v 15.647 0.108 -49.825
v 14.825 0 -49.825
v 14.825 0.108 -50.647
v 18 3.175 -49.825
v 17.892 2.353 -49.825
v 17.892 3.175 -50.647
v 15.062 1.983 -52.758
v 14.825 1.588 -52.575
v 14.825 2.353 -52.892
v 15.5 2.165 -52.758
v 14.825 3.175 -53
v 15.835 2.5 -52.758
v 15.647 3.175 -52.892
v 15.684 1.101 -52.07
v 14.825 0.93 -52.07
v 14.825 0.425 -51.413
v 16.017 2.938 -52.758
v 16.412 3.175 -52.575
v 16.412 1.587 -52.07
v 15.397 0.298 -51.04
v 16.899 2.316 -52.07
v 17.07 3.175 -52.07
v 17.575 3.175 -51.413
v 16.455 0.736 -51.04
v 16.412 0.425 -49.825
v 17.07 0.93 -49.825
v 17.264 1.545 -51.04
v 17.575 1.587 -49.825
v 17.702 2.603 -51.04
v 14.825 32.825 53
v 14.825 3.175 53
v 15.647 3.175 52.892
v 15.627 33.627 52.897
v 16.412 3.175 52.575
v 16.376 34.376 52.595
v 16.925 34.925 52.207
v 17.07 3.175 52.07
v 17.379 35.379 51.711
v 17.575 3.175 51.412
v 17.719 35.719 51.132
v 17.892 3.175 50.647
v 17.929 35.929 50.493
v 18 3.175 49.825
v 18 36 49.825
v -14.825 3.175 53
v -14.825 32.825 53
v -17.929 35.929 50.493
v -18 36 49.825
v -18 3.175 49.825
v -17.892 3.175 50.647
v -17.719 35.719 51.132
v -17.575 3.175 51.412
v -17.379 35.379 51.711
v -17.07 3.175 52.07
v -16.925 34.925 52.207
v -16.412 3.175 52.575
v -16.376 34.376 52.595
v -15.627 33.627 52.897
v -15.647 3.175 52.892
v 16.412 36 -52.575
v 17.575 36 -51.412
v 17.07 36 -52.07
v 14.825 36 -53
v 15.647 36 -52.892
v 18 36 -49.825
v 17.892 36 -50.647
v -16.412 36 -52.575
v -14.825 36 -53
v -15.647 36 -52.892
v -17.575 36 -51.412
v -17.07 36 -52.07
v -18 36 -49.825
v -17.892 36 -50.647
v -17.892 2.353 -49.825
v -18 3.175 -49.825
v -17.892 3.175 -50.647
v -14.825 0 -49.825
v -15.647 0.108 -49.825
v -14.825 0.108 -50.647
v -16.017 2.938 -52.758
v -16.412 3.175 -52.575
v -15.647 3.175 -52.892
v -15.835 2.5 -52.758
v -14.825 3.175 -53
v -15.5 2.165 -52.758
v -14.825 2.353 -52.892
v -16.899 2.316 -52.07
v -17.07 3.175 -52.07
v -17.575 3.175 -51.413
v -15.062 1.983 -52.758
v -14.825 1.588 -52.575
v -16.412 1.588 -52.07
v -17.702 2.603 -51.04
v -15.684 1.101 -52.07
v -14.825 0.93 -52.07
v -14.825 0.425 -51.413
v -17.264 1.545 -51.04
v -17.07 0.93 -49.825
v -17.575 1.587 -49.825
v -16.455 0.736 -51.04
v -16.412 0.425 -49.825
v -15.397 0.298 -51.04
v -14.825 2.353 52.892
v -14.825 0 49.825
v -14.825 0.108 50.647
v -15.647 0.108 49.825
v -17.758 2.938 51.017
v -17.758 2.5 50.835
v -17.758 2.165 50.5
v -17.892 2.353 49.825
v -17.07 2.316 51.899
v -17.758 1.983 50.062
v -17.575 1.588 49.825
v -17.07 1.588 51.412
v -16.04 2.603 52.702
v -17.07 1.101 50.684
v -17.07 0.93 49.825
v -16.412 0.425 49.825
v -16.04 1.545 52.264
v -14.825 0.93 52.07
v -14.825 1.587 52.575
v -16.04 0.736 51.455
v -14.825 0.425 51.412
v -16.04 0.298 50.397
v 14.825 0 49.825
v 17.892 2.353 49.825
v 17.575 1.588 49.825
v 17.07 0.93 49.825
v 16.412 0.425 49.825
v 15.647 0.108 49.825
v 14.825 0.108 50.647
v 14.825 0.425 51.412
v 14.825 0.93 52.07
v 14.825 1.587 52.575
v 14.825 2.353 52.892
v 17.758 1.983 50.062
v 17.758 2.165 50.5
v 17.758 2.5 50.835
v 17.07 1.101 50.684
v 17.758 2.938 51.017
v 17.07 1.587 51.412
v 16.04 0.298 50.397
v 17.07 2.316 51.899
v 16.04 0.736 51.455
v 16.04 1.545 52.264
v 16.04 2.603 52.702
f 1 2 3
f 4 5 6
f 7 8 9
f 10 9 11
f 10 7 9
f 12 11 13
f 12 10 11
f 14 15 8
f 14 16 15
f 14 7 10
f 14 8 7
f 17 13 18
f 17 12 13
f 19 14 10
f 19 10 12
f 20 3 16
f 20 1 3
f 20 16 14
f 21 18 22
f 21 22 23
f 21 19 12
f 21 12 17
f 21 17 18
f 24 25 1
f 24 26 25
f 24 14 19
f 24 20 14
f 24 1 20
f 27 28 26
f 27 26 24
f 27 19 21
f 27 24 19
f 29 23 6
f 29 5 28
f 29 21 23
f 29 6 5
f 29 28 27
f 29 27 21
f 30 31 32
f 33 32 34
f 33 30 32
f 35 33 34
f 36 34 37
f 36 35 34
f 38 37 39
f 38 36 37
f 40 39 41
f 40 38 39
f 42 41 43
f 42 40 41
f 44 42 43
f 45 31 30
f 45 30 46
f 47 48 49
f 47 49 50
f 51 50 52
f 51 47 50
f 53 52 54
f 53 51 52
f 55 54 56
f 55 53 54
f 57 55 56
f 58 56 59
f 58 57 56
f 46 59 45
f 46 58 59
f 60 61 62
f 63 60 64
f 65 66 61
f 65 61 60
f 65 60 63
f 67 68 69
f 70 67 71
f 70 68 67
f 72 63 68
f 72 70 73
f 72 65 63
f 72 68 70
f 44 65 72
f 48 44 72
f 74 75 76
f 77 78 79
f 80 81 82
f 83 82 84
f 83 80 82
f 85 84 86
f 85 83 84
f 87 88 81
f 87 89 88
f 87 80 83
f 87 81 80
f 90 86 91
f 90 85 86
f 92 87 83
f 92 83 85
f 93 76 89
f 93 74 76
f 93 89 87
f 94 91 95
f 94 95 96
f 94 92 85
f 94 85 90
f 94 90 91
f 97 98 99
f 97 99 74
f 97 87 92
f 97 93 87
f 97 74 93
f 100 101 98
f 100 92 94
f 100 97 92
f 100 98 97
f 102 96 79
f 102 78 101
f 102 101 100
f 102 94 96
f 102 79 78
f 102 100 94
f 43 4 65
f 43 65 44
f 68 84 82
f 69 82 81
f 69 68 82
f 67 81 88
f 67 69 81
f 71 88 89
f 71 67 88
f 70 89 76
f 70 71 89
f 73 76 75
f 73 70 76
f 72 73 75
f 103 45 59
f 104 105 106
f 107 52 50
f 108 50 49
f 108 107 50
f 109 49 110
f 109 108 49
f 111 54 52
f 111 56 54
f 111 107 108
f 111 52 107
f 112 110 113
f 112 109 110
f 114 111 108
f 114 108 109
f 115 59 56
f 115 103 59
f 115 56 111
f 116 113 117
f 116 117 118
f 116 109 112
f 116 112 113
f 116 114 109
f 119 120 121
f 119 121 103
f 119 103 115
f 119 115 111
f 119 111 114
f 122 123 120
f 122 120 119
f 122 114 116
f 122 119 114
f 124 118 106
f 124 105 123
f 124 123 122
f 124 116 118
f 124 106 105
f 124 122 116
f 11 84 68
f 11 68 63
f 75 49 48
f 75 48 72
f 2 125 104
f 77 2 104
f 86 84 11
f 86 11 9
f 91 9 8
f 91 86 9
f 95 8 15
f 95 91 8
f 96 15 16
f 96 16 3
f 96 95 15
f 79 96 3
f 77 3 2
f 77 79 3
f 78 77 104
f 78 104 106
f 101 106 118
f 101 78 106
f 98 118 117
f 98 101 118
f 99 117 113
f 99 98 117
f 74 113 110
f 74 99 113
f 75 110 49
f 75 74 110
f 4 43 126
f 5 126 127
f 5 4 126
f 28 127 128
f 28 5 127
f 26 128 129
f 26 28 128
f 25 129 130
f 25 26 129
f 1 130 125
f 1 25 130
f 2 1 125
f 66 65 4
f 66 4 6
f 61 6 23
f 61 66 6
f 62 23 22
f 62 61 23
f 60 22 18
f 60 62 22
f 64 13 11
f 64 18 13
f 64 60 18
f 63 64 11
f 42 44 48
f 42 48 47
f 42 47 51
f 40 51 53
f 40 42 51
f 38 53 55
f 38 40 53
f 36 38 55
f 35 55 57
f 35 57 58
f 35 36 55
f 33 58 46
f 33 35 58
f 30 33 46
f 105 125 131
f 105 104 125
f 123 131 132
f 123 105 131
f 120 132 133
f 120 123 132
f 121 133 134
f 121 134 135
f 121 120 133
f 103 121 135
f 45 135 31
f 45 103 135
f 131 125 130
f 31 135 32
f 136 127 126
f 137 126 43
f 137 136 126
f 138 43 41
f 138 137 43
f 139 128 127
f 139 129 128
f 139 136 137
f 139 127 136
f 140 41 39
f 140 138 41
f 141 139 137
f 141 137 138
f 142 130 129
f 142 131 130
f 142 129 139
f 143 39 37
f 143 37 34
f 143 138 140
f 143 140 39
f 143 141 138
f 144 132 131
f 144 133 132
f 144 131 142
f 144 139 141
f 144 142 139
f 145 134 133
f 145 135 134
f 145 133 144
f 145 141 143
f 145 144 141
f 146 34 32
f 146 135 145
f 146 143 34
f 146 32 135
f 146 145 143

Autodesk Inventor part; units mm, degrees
ref_plane "YZ Plane" through (0, 0, 0) normal (1, 0, 0) x (0, 1, 0)
ref_plane "XZ Plane" through (0, 0, 0) normal (0, 1, 0) x (-1, 0, 0)
ref_plane "XY Plane" through (0, 0, 0) normal (0, 0, 1) x (1, 0, 0)
sketch "Sketch1" plane through (0, 0, 0) normal (0, 1, 0) x (-1, 0, 0)
  line L0 (0, -74.2) -> (0, 74.2) projected
  line L1 (-25.2, 0) -> (25.2, 0) projected
  line L2 (25.2, 0) -> (-25.2, 0) projected
  line L3 (0, -74.2) -> (0, 74.2) projected
  line L4 (18, -53) -> (-18, -53)
  line L5 (-18, -53) -> (-18, 53)
  line L6 (-18, 53) -> (18, 53)
  line L7 (18, 53) -> (18, -53)
  point P0 (0, 0)
  dimension "d0" = 36
  dimension "d1" = 106
extrude "Extrusion1" add sketch "Sketch1" along normal blind 36
fillet "Fillet1" radius 3.175 9 edges at (0, 36, 53) (0, 0, 53) (18, 0, 0) (-18, 0, 0) (-18, 18, 53) (18, 18, 53) (0, 0, -53) (-18, 18, -53) (18, 18, -53)
sketch "Sketch2" plane through (0, 36, 0) normal (0, 1, 0) x (1, 0, 0)
  line L0 (-9.0879, 39.1401) -> (9.0879, 39.1401) construction
  line L1 (9.0879, 39.1401) -> (9.0879, -37.9009) construction
  line L2 (9.0879, -37.9009) -> (-9.0879, -37.9009) construction
  line L3 (-9.0879, -37.9009) -> (-9.0879, 39.1401) construction
  point P0 (0, 0)
properties part number "G5_50C_4S_2500mah_LiPo"
